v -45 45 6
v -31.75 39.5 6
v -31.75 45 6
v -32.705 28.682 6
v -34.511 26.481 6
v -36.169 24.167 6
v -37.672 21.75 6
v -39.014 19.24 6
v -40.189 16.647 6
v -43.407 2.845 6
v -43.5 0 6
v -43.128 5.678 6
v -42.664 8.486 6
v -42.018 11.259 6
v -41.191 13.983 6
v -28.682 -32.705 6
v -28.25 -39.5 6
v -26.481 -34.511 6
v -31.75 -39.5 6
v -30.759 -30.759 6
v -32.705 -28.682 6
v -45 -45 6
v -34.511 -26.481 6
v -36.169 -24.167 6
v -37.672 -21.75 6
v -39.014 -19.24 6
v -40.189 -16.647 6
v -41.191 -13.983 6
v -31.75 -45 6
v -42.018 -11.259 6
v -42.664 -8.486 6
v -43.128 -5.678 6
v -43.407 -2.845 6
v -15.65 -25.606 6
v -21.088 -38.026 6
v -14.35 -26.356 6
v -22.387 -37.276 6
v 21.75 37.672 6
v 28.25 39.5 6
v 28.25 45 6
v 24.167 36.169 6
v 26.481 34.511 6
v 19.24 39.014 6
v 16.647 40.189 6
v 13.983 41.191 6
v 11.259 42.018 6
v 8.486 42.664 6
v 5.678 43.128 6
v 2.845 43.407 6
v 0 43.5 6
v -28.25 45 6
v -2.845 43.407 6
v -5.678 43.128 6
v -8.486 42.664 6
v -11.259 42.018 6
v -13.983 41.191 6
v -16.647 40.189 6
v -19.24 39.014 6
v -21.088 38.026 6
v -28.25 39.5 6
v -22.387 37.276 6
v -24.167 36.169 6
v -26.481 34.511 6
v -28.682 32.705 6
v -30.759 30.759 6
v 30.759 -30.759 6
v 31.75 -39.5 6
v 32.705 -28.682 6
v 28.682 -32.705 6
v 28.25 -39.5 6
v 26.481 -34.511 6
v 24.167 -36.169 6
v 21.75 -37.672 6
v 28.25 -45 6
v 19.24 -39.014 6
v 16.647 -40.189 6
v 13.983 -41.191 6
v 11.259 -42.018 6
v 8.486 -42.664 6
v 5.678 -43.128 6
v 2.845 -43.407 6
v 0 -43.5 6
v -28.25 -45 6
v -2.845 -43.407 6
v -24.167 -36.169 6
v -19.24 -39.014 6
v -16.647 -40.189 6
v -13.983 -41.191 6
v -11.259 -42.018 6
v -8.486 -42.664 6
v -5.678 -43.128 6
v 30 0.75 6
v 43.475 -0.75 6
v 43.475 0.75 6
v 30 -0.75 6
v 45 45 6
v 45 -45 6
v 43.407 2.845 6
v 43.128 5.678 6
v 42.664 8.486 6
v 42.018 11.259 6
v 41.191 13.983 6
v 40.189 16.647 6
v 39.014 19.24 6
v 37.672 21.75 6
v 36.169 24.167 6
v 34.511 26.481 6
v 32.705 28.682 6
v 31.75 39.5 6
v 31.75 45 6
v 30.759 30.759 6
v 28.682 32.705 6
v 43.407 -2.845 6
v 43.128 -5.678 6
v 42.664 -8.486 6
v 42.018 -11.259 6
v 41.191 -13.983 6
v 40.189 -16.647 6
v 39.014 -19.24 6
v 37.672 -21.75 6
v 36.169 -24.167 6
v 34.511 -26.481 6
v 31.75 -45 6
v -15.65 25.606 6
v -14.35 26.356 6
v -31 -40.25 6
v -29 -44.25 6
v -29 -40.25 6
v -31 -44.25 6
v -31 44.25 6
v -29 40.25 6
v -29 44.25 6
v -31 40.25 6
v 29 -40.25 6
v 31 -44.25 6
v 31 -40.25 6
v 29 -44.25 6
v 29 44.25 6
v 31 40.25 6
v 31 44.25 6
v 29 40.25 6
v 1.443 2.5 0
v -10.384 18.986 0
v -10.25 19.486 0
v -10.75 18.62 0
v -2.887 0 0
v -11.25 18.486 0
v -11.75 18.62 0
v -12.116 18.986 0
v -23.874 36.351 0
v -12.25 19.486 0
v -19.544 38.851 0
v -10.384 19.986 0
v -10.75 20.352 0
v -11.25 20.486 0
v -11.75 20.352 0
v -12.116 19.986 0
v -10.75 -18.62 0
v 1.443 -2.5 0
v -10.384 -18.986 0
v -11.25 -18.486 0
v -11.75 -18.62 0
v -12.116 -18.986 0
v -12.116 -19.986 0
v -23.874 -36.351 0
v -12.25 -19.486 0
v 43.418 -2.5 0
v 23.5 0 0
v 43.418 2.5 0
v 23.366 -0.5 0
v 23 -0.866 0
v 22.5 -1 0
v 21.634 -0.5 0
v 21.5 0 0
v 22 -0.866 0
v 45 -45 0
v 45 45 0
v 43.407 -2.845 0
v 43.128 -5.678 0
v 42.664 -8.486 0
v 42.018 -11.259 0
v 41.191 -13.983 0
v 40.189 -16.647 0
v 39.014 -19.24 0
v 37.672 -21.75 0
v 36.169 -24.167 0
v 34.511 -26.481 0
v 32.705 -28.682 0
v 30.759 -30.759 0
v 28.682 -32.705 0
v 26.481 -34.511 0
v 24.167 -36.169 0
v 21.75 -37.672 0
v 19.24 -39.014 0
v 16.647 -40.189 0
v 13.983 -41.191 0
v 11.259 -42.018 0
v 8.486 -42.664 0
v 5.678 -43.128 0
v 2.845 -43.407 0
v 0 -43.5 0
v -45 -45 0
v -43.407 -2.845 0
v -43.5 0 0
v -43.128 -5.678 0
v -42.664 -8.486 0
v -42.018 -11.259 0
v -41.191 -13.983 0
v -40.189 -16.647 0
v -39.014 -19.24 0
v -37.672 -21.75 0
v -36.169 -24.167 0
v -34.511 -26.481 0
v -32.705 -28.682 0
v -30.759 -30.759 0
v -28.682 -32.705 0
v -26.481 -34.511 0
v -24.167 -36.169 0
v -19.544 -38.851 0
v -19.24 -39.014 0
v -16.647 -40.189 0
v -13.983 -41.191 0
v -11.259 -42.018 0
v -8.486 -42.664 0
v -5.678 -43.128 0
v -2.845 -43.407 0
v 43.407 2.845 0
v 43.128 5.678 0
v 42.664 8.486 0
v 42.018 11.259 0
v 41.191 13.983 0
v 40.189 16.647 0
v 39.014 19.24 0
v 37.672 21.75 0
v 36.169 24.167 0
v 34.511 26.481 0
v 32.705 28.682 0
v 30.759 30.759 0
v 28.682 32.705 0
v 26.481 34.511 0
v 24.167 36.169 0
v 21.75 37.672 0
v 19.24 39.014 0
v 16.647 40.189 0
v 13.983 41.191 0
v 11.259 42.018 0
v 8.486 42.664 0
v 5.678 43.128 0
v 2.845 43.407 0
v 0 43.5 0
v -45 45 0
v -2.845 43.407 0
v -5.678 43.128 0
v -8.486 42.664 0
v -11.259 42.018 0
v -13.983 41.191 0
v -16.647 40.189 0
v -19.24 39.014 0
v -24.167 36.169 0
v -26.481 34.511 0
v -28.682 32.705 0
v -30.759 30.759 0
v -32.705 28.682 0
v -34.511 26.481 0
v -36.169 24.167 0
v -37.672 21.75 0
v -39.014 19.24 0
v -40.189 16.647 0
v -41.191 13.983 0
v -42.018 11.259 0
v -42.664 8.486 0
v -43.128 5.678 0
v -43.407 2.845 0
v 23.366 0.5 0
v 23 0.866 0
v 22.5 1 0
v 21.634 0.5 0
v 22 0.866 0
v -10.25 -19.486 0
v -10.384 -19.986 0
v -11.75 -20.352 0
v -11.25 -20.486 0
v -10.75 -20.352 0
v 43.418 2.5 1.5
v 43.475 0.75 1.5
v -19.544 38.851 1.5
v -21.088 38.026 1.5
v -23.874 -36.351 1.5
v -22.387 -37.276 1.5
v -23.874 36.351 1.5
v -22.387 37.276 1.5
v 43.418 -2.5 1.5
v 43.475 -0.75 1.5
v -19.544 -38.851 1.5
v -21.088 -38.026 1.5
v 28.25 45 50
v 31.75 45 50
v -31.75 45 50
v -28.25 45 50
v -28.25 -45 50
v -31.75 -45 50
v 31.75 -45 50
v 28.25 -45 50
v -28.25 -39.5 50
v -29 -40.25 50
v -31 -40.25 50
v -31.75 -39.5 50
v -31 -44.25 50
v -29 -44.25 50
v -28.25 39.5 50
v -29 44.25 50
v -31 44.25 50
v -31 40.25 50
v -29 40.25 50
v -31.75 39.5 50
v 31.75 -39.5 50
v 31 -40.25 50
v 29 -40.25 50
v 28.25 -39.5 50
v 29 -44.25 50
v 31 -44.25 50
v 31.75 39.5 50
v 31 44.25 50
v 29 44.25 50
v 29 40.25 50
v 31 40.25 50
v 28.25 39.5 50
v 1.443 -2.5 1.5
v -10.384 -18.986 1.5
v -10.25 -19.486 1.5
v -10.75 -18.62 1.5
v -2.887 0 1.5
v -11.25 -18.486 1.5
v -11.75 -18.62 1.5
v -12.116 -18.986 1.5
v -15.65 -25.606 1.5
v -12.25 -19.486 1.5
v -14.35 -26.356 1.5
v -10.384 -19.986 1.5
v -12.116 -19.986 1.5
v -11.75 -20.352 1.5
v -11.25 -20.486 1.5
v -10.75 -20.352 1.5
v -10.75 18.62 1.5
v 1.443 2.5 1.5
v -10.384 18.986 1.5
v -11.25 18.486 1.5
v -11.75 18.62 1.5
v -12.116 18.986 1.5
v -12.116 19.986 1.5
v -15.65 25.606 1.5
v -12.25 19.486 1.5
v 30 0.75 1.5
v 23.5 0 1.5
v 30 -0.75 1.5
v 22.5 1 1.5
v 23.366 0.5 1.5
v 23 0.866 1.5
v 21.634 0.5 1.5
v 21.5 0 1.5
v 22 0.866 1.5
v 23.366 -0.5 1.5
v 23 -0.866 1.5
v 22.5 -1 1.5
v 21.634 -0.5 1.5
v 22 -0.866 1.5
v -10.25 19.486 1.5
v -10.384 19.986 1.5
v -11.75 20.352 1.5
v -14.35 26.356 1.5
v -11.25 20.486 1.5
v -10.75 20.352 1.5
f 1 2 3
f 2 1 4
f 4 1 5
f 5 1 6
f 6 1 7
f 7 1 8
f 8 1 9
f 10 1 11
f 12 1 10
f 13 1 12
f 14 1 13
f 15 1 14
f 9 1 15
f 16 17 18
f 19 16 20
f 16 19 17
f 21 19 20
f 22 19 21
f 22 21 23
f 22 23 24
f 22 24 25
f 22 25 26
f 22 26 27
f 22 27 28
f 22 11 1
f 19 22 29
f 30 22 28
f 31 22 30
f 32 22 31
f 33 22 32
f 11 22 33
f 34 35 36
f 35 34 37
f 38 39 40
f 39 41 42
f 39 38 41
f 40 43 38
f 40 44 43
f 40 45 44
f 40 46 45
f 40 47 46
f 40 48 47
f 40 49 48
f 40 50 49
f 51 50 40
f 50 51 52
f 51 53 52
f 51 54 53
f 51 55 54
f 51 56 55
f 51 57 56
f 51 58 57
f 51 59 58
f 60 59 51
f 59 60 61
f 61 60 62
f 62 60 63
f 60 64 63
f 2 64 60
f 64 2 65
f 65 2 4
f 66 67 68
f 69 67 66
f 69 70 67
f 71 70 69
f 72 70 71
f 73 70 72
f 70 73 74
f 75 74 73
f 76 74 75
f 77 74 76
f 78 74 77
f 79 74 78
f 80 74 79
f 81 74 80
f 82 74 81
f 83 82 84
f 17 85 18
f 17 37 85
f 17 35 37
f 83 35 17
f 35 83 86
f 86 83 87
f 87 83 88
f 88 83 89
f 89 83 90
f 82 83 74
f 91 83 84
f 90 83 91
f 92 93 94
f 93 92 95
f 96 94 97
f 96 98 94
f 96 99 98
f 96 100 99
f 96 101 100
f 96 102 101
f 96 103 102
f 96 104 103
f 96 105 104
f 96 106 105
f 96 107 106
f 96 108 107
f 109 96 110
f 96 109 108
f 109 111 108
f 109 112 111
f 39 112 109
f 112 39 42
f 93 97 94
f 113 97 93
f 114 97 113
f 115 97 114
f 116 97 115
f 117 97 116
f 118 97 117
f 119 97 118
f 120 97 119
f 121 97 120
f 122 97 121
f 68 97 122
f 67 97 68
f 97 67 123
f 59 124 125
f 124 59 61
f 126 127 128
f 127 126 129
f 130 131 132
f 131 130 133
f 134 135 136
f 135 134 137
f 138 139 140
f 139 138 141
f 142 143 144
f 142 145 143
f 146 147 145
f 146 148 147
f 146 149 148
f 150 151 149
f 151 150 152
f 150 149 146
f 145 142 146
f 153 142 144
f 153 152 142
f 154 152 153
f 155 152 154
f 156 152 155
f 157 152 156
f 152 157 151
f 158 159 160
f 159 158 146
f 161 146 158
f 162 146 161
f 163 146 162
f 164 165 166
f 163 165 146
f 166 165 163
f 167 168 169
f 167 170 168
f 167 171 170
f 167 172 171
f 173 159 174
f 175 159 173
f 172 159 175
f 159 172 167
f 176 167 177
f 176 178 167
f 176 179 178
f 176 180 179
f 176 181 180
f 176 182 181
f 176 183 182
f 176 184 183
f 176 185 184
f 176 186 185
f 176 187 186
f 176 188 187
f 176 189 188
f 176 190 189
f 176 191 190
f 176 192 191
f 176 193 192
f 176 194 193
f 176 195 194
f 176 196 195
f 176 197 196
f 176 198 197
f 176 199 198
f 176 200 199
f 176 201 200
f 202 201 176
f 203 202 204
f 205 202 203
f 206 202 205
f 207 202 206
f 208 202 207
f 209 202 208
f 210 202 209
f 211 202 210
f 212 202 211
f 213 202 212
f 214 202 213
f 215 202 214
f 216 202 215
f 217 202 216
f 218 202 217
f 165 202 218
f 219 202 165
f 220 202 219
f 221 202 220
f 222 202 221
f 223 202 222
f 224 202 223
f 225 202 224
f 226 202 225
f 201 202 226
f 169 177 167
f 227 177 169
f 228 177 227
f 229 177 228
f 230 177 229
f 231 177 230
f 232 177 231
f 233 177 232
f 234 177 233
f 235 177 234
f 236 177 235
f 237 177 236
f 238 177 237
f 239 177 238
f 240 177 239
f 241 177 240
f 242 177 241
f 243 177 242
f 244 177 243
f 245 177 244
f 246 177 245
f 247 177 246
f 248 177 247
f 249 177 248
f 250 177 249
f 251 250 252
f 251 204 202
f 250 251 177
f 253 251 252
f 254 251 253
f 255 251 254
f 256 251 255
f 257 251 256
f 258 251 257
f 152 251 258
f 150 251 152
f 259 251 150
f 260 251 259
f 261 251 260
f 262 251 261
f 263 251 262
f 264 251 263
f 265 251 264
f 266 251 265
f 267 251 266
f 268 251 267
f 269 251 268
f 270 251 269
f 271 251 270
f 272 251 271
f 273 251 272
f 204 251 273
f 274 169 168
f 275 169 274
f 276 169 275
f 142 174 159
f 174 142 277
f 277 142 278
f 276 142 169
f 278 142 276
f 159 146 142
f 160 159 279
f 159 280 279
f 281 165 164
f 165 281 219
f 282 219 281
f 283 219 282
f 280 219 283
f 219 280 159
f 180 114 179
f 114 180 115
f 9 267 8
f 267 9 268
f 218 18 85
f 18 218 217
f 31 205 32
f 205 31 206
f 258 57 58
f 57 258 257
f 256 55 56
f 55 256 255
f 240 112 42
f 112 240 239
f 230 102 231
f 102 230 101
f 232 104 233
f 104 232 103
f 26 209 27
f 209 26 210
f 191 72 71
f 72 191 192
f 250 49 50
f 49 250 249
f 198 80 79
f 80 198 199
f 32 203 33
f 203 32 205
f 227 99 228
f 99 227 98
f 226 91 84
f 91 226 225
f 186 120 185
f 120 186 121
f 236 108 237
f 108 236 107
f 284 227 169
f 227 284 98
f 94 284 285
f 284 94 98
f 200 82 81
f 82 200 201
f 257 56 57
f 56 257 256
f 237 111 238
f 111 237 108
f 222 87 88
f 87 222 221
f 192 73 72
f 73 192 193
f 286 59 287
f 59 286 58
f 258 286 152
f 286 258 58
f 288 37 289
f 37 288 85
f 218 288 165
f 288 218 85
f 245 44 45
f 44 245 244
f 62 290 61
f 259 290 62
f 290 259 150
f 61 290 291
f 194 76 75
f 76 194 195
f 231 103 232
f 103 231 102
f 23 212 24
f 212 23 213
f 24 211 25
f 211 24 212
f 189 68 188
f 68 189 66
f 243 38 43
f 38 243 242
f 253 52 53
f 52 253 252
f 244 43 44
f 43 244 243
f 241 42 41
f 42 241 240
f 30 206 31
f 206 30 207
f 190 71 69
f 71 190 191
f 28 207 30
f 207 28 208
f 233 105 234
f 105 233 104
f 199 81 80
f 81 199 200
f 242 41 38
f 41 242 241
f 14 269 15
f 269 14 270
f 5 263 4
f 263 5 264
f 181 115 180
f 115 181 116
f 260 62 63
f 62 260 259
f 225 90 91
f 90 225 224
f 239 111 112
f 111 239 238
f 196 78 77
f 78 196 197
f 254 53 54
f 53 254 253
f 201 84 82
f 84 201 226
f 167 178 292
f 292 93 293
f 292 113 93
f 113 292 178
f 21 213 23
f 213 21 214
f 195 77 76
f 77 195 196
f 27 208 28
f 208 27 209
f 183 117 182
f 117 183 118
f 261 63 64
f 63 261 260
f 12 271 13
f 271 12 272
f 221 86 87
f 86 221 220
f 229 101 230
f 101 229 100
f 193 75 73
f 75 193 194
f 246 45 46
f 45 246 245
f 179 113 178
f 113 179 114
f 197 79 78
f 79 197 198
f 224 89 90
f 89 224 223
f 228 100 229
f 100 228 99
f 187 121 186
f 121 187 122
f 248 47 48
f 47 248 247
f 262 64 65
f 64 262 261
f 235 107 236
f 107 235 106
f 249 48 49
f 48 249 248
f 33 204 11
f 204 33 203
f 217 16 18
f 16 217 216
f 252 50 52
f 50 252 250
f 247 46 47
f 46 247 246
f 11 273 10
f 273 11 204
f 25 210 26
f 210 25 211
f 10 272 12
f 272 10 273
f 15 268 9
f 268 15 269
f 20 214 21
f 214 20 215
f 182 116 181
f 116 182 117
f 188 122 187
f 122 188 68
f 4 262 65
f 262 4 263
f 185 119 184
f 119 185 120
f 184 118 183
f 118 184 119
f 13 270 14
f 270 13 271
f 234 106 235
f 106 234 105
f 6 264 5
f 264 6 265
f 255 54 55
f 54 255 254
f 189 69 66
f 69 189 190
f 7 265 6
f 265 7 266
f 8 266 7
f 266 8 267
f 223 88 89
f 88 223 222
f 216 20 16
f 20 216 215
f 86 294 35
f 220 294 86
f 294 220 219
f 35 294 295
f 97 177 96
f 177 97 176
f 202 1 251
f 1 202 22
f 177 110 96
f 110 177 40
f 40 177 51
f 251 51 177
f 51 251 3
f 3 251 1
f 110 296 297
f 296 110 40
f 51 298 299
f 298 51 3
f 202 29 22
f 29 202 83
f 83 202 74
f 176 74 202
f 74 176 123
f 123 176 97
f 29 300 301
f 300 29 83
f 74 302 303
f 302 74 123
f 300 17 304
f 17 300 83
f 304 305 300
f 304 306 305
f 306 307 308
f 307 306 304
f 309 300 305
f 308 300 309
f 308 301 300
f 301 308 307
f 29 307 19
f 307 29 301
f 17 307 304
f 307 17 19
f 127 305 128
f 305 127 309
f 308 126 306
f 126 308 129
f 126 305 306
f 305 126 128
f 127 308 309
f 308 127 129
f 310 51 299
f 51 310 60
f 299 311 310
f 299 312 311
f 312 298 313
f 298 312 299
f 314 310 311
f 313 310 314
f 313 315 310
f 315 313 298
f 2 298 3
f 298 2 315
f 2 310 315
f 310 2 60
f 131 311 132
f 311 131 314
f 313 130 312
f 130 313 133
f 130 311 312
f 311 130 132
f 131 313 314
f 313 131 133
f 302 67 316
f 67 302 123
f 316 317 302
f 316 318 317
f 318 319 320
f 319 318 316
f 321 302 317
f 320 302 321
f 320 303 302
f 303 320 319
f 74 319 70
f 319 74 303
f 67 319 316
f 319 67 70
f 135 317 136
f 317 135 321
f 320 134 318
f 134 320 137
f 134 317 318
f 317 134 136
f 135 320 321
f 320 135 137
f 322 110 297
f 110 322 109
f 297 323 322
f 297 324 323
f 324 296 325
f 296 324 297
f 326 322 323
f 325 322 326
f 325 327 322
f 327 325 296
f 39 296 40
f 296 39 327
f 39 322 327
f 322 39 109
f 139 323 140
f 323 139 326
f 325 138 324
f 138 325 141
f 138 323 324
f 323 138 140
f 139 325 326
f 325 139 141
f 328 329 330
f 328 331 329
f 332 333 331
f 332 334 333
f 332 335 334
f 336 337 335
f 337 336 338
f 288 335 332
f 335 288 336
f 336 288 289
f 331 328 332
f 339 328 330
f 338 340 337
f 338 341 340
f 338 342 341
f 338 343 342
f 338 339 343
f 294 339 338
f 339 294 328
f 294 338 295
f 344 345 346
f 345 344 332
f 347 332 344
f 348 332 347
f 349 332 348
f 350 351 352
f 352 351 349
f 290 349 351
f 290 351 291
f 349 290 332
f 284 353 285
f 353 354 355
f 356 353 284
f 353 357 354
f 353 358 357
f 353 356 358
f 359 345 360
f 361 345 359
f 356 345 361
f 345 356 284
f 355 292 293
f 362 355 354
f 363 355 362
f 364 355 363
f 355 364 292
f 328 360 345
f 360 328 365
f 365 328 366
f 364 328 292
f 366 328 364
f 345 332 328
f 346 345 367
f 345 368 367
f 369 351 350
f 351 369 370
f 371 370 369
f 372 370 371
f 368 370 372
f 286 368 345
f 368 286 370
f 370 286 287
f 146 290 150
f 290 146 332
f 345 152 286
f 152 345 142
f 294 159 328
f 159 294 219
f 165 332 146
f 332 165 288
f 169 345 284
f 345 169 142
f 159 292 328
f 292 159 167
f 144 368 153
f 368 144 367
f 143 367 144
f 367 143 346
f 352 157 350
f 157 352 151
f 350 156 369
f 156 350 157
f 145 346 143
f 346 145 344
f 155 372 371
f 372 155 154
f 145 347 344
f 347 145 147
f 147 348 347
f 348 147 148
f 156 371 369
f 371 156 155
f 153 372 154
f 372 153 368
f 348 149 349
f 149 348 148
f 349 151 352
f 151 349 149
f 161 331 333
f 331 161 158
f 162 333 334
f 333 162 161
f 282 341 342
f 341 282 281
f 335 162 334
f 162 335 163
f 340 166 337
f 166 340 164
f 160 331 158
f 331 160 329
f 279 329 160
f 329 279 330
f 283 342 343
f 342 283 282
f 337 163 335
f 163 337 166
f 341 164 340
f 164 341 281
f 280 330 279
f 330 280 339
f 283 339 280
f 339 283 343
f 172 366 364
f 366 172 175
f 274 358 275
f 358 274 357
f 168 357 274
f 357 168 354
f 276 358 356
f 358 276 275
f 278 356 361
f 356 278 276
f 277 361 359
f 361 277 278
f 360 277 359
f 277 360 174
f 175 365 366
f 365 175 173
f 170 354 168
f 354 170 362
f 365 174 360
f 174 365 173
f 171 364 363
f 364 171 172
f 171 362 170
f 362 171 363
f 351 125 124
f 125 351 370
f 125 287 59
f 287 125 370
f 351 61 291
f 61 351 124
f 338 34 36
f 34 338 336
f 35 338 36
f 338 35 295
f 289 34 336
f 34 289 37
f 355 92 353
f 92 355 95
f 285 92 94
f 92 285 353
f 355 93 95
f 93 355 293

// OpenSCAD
brace_length = 15;
bracket_diameter = 90;
bracket_length = 6;
mounting_plate_width = 5;
mounting_screws = 3;
mounting_screw_location_radius = 22.5;
mounting_screw_diameter = 2;
hollow_arm_length = 50;
hollow_interior_width = 2;
hollow_interior_length = 4;
hollow_arm_fan_mount_factor = 0.75;
wall_thickness = 1.5;
epsilon = 0.05;
motor_diameter = 60;
motor_barrel_length = 60;
clamp_gap = 2;
clamp_arm_length = 10;
clamp_arm_clearance_hole_diameter=3.2;
clamp_arm_pilot_hole_diameter=2.7;
clearance=0.7;


module fan_mount() {
  union () {
    // Circular walls
    difference() {
      cylinder($fn=96,d=bracket_diameter,h=bracket_length);
      translate([0,0,-epsilon]) {
        cylinder($fn=96,r=bracket_diameter/2-wall_thickness,h=bracket_length+2*epsilon);
      }
    }
    // Base plate
    difference() {
      translate([-bracket_diameter/2,-bracket_diameter/2,0]) {
        cube([bracket_diameter, bracket_diameter, bracket_length]);
      }
      translate([0,0,-epsilon]) {
        cylinder($fn=96,r=bracket_diameter/2-wall_thickness,h=bracket_length+2*epsilon);
      }
    }
    // Hollow supports
    x_offset = motor_barrel_length / 2;
    y_offset = bracket_diameter/2 - hollow_interior_length/2 - wall_thickness/2;
    for (x = [-x_offset,x_offset],
           y = [-y_offset,y_offset]) {
      translate([x,y,hollow_arm_length/2]) {
        difference() {
          cube([hollow_interior_width+wall_thickness, hollow_interior_length+wall_thickness, hollow_arm_length], center=true);
          translate([0, 0, epsilon+wall_thickness/2]) {
            cube([hollow_interior_width, hollow_interior_length, hollow_arm_length-wall_thickness], center=true);
          }
        }
      }
    }
    // End arms
    difference() {
      for (i = [1:mounting_screws]) {
        rotate([0,0,i*360/mounting_screws]) {
          translate([0,-mounting_plate_width/2,0]) {
            cube([bracket_diameter/2,mounting_plate_width,wall_thickness]);
          }
        }
      }
      for (i = [1:mounting_screws]) {
        rotate([0,0,i*360/mounting_screws]) {
          translate([mounting_screw_location_radius,0,-epsilon]) {
            cylinder($fn=12,h=wall_thickness+2*epsilon,d=mounting_screw_diameter);
          }
        }
      }
    }
    // Braces
    for (i = [1:mounting_screws]) {
      rotate([0,0,i*360/mounting_screws]) {
        translate([bracket_diameter/2-brace_length,-wall_thickness/2,0]) {
          cube([brace_length,wall_thickness,bracket_length]);
        }
      }
    }
  }
}

module motor_mount() {
  union() {
    // Cylindrical walls
    difference() {
      cylinder($fn=96,r=motor_diameter/2,h=bracket_length);
      translate([0,0,-epsilon]) {
        cylinder($fn=96,r=motor_diameter/2-wall_thickness,h=bracket_length+2*epsilon);
      }
      // Gap
      translate([motor_diameter/2-wall_thickness-epsilon,-clamp_gap/2,-epsilon]) {
        cube([wall_thickness+2*epsilon, clamp_gap, bracket_length+2*epsilon]);
      }
    }
    difference() {
      // Clamp arms
      for (y = [-clamp_gap/2-wall_thickness, clamp_gap/2]) {
        translate([motor_diameter/2-wall_thickness,y,0]) {
          #cube([clamp_arm_length,wall_thickness,bracket_length]);
        }
      }
      // Screw holes
      translate([motor_diameter/2+clamp_arm_length/2,-clamp_gap/2+epsilon,bracket_length/2]) {
        rotate([90,0,0]) {
          cylinder($fn=24,d=clamp_arm_clearance_hole_diameter,h=wall_thickness+2*epsilon);
        }
      }
      translate([motor_diameter/2+clamp_arm_length/2,clamp_gap/2+epsilon+wall_thickness,bracket_length/2]) {
        rotate([90,0,0]) {
          cylinder($fn=24,d=clamp_arm_pilot_hole_diameter,h=wall_thickness+2*epsilon);
        }
      }

    }
    // Base
    difference() {
      linear_extrude(height=hollow_interior_width-clearance) {
        polygon(points=[[0,motor_diameter/2],
                        [-motor_diameter/2,bracket_diameter/2-clearance],
                        [-motor_diameter/2,-bracket_diameter/2+clearance],
                        [0,-motor_diameter/2]]);
      }
      translate([0,0,-epsilon]) {
        cylinder($fn=96,r=motor_diameter/2-wall_thickness,h=bracket_length+2*epsilon);
      }
    }
    // Arms
    for (y=[-bracket_diameter/2+wall_thickness/2+clearance/2,bracket_diameter/2-wall_thickness/2-hollow_interior_length+clearance/2]) {
      translate([-hollow_arm_length*hollow_arm_fan_mount_factor-motor_diameter/2,y,0]) {
        cube([hollow_arm_length*hollow_arm_fan_mount_factor,hollow_interior_length-clearance,hollow_interior_width-clearance]);
      }
    }
  }
}

module both() {
  union() {
    fan_mount();
    translate([bracket_diameter/2,0,hollow_arm_length]) {
      rotate([0,90,0]) {
        color([1,0,0,0.5]) {
          motor_mount();
        }
      }
    }
  }
}

//motor_mount();
fan_mount();
